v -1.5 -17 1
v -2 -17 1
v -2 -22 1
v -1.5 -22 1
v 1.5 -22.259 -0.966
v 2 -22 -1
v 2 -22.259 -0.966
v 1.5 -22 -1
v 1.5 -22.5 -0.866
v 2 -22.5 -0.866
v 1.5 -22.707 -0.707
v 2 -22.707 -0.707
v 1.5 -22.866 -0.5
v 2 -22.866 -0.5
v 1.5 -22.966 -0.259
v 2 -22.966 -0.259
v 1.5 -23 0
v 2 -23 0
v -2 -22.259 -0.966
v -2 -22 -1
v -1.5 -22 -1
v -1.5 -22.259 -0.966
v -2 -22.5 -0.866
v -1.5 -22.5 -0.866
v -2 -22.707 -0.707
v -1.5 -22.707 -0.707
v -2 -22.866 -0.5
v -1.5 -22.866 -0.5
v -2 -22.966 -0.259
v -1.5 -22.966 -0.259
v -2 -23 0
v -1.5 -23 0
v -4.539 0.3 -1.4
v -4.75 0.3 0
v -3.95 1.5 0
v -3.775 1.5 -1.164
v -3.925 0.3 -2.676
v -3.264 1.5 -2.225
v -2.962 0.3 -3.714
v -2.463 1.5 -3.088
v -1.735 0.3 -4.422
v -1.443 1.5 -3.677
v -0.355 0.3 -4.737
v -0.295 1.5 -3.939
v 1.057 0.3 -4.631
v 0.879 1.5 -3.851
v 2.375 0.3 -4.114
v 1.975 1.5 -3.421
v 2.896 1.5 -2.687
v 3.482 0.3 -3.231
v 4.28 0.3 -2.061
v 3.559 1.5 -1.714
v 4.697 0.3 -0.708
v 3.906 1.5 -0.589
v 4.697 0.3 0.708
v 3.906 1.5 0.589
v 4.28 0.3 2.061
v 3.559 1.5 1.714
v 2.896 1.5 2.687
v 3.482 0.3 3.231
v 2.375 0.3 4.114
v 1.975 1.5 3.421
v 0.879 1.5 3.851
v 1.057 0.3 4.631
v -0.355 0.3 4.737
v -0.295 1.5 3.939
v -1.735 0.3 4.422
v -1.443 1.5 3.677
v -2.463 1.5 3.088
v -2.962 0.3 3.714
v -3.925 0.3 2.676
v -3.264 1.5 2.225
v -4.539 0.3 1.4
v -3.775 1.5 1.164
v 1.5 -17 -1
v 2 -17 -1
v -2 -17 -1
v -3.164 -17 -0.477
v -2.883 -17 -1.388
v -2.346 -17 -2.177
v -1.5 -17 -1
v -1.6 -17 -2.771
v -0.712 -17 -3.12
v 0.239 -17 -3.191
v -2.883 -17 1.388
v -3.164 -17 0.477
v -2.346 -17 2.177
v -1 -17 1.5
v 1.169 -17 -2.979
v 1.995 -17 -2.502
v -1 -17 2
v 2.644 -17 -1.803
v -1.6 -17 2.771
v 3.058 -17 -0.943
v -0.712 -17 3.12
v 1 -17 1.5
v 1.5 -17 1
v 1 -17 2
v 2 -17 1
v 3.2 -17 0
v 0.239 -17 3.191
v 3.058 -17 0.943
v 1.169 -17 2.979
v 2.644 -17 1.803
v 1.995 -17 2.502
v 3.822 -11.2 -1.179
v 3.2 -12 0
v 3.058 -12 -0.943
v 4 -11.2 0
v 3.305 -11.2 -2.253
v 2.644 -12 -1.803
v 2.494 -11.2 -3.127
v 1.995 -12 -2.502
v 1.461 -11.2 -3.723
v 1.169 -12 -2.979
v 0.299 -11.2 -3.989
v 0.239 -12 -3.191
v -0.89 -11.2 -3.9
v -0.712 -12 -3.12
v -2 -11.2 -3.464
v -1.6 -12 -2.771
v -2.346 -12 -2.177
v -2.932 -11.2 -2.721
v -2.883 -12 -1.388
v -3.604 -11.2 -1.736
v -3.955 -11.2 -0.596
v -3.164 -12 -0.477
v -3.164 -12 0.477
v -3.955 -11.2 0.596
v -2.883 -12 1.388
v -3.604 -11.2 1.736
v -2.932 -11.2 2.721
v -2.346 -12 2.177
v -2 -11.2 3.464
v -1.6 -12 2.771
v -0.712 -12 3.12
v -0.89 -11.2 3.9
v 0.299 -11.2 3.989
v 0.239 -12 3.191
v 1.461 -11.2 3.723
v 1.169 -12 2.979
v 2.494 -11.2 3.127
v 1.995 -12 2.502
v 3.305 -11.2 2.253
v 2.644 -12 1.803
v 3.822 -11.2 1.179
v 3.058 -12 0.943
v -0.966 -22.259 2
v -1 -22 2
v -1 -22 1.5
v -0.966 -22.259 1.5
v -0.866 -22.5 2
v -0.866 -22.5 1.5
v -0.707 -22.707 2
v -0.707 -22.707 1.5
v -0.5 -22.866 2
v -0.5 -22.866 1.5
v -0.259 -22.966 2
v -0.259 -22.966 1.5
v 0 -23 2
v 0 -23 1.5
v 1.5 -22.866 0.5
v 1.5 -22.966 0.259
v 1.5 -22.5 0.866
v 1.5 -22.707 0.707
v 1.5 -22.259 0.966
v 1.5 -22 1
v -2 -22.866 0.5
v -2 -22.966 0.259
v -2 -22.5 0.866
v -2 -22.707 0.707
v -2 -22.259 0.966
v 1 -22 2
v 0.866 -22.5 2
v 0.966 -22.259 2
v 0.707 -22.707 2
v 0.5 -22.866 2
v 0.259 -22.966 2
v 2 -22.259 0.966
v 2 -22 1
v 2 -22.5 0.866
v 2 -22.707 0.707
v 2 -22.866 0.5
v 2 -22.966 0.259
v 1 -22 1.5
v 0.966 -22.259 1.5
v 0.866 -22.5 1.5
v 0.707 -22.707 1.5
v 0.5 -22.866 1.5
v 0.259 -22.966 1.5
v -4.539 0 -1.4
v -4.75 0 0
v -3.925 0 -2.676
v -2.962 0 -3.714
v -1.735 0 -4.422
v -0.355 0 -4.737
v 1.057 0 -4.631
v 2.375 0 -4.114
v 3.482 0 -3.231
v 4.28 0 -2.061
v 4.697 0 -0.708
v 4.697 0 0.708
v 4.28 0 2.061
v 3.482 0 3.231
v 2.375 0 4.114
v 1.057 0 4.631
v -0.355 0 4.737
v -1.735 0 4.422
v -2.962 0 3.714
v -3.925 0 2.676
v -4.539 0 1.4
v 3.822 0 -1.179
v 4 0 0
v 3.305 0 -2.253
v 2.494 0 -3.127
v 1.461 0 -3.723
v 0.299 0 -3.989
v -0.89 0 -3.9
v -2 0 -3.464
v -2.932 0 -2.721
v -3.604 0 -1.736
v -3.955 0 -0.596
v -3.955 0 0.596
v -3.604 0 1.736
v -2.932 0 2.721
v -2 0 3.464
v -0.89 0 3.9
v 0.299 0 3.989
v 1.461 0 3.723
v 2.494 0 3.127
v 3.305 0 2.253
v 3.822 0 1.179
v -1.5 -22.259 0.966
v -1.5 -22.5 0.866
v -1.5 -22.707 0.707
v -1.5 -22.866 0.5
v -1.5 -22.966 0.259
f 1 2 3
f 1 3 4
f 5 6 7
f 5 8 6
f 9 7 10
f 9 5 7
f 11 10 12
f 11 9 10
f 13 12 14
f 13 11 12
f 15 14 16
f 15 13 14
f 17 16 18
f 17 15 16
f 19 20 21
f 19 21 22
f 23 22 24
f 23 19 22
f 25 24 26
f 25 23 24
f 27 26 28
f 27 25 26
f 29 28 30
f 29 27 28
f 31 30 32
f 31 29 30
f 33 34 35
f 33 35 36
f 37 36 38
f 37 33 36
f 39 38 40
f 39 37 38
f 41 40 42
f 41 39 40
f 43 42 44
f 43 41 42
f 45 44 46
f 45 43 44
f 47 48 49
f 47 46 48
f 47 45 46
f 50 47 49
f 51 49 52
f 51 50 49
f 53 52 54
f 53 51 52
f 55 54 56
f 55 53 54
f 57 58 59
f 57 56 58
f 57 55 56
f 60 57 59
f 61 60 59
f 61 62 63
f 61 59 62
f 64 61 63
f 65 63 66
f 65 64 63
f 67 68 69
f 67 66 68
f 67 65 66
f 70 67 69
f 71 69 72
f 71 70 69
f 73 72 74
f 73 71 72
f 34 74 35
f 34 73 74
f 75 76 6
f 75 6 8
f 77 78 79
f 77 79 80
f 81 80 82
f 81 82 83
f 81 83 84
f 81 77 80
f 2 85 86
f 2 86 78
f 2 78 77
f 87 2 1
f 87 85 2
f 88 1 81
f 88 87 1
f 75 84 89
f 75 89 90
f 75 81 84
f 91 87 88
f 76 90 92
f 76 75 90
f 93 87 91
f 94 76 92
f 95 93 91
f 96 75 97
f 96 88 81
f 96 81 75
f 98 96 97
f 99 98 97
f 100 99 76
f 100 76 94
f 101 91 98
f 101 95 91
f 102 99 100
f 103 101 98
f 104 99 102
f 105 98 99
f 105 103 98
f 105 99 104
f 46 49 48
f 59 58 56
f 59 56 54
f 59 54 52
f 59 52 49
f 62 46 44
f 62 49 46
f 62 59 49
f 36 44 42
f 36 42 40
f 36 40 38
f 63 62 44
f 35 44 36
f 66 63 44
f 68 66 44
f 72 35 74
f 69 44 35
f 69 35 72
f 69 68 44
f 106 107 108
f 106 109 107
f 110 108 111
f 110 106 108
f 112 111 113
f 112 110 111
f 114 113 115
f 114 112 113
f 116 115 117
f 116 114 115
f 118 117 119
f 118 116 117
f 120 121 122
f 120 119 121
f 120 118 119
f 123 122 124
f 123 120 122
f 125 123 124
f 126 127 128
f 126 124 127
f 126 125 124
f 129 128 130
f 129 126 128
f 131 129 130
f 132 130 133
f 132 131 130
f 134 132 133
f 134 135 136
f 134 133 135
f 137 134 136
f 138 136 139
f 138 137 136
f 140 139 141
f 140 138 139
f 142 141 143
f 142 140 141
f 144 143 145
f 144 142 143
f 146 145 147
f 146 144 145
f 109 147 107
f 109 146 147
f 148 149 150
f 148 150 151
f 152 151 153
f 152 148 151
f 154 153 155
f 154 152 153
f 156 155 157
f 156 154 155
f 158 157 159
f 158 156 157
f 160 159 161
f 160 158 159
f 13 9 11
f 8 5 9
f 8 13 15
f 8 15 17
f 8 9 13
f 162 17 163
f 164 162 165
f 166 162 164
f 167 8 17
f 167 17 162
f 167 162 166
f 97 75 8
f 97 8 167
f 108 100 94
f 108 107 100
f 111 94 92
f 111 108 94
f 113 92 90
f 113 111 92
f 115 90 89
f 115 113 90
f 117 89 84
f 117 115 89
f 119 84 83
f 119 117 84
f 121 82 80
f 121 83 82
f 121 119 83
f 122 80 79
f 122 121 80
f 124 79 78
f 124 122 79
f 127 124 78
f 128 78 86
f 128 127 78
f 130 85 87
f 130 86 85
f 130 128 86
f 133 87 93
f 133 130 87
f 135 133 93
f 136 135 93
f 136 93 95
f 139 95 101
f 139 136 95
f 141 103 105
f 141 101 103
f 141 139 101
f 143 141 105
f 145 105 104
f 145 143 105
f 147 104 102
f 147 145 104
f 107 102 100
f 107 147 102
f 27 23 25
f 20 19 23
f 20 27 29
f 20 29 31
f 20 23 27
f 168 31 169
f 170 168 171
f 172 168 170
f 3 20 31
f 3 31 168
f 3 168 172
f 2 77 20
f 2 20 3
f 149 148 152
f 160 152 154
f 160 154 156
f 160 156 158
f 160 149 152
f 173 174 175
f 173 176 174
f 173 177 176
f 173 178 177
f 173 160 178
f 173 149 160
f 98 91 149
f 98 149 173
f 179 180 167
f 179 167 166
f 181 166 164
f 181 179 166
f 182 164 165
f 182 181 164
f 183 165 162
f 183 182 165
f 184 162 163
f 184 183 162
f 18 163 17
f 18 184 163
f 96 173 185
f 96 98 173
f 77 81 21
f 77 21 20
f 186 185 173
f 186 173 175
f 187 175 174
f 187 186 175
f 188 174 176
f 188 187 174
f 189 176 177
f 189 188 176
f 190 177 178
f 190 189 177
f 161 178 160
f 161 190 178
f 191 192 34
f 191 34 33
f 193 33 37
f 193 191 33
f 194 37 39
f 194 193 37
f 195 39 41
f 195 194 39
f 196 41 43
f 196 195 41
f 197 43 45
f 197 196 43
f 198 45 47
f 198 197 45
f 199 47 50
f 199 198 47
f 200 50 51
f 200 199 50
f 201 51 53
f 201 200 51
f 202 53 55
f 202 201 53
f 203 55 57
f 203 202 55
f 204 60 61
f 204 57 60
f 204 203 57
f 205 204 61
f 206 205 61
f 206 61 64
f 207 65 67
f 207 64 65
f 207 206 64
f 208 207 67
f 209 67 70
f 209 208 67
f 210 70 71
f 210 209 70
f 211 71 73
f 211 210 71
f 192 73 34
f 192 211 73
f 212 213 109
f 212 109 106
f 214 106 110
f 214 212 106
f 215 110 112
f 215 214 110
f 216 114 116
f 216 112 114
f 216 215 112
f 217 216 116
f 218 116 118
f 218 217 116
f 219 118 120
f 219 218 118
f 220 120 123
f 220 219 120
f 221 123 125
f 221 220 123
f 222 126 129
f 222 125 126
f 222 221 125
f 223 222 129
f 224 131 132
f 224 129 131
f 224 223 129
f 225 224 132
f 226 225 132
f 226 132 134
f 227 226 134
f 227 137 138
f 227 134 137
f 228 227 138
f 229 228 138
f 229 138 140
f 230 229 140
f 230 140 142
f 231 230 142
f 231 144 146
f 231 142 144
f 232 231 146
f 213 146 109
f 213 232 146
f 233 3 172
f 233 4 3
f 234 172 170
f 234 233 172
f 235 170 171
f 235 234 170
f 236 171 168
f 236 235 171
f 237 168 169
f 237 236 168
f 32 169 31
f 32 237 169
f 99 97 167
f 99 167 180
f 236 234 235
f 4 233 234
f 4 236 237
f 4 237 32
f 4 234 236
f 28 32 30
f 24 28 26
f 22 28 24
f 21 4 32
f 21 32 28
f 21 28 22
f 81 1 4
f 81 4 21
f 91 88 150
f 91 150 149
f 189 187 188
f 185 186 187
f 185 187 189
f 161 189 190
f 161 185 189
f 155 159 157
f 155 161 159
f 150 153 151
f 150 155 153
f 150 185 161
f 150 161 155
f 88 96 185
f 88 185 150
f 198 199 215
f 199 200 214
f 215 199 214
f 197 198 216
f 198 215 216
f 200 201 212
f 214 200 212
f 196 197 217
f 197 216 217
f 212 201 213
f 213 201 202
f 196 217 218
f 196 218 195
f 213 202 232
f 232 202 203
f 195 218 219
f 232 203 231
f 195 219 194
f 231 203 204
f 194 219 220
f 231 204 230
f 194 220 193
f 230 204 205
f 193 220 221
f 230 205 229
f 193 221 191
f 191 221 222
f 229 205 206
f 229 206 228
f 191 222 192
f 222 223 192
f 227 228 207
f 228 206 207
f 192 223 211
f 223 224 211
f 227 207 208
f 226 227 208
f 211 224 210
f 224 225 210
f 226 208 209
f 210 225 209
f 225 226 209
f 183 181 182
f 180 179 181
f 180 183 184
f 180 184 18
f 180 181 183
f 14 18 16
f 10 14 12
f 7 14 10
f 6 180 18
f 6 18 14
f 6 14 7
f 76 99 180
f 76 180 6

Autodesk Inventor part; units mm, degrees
ref_plane "YZ Plane" through (0, 0, 0) normal (1, 0, 0) x (0, 1, 0)
ref_plane "XZ Plane" through (0, 0, 0) normal (0, 1, 0) x (-1, 0, 0)
ref_plane "XY Plane" through (0, 0, 0) normal (0, 0, 1) x (1, 0, 0)
sketch "Sketch1" plane through (0, 0, 0) normal (0, 1, 0) x (-1, 0, 0)
  circle A0 centre (0, 0) radius 4.75
  dimension "d0" = 9.5
extrude "Extrusion1" add sketch "Sketch1" along normal blind 1.5
chamfer "Chamfer1" distance 0.8 distance2 1.2 1 edges at (4.75, 1.5, 0) measured on face at (-1.1851, 1.5, -1.0499)
sketch "Sketch2" plane through (0, 0, 0) normal (0, -1, 0) x (1, 0, 0)
  circle A0 centre (0, 0) radius 4
  dimension "d6" = 8
extrude "Extrusion2" add sketch "Sketch2" along normal blind 12
chamfer "Chamfer2" distance 0.8 angle 45 1 edges at (-4, -12, 0)
thread "Thread1" size "M8x0.75" class "6g" standard "ANSI Metric M Profile" length 12.5
sketch "Sketch3" plane through (0, -12, 0) normal (0, -1, 0) x (1, 0, 0)
  circle A0 centre (0, 0) radius 3.2
extrude "Extrusion3" add sketch "Sketch3" along normal blind 5
sketch "Sketch4" plane through (0, -17, 0) normal (0, -1, 0) x (1, 0, 0)
  line L0 (1.75, -1.75) -> (-1.75, -1.75)
  line L1 (1.75, -1.75) -> (-1.75, 1.75) construction
  line L2 (-1.75, -1.75) -> (1.75, 1.75) construction
  line L3 (0, 6.1884) -> (0, -7.5413) construction
  line L4 (-9.3951, 0) -> (6.4878, 0) construction
  line L5 (1, 1.5) -> (-1, 1.5)
  line L6 (-1, 1.5) -> (-1, 2)
  line L7 (-1, 2) -> (1, 2)
  line L8 (1, 2) -> (1, 1.5)
  line L9 (1, 1.5) -> (-1, 2) construction
  line L10 (-1, 1.5) -> (1, 2) construction
  line L11 (2, -1) -> (1.5, -1)
  line L12 (1.5, -1) -> (1.5, 1)
  line L13 (1.5, 1) -> (2, 1)
  line L14 (2, 1) -> (2, -1)
  line L15 (2, -1) -> (1.5, 1) construction
  line L16 (1.5, -1) -> (2, 1) construction
  line L17 (-1.5, -1) -> (-2, -1)
  line L18 (-2, -1) -> (-2, 1)
  line L19 (-2, 1) -> (-1.5, 1)
  line L20 (-1.5, 1) -> (-1.5, -1)
  line L21 (-1.5, -1) -> (-2, 1) construction
  line L22 (-2, -1) -> (-1.5, 1) construction
  line L23 (1.75, 1.75) -> (1.75, 1)
  line L24 (1.75, -1) -> (1.75, -1.75)
  line L25 (-1.75, -1.75) -> (-1.75, -1)
  line L26 (-1.75, 1) -> (-1.75, 1.75)
  line L27 (-1.75, 1.75) -> (-1, 1.75)
  line L28 (1, 1.75) -> (1.75, 1.75)
  point P0 (0, 0)
  point P1 (0, 0)
  point P2 (0, 0)
  dimension "d16" = 3.5
  dimension "d17" = 3.5
  dimension "d18" = 2
  dimension "d19" = 0.5
  dimension "d20" = 0.5
  dimension "d21" = 2
  dimension "d22" = 0.5
  dimension "d23" = 2
extrude "Extrusion4" add sketch "Sketch4" along normal blind 6 contours L11 L12 L13 L14 | L17 L18 L19 L20 | L8 L5 L6 L7
fillet "Fillet1" radius 1 6 edges at (-1.75, -23, 1) (-1.75, -23, -1) (-1, -23, 1.75) (1, -23, 1.75) (1.75, -23, 1) (1.75, -23, -1)
properties part number "LED Indicator Farnell 19100054"
